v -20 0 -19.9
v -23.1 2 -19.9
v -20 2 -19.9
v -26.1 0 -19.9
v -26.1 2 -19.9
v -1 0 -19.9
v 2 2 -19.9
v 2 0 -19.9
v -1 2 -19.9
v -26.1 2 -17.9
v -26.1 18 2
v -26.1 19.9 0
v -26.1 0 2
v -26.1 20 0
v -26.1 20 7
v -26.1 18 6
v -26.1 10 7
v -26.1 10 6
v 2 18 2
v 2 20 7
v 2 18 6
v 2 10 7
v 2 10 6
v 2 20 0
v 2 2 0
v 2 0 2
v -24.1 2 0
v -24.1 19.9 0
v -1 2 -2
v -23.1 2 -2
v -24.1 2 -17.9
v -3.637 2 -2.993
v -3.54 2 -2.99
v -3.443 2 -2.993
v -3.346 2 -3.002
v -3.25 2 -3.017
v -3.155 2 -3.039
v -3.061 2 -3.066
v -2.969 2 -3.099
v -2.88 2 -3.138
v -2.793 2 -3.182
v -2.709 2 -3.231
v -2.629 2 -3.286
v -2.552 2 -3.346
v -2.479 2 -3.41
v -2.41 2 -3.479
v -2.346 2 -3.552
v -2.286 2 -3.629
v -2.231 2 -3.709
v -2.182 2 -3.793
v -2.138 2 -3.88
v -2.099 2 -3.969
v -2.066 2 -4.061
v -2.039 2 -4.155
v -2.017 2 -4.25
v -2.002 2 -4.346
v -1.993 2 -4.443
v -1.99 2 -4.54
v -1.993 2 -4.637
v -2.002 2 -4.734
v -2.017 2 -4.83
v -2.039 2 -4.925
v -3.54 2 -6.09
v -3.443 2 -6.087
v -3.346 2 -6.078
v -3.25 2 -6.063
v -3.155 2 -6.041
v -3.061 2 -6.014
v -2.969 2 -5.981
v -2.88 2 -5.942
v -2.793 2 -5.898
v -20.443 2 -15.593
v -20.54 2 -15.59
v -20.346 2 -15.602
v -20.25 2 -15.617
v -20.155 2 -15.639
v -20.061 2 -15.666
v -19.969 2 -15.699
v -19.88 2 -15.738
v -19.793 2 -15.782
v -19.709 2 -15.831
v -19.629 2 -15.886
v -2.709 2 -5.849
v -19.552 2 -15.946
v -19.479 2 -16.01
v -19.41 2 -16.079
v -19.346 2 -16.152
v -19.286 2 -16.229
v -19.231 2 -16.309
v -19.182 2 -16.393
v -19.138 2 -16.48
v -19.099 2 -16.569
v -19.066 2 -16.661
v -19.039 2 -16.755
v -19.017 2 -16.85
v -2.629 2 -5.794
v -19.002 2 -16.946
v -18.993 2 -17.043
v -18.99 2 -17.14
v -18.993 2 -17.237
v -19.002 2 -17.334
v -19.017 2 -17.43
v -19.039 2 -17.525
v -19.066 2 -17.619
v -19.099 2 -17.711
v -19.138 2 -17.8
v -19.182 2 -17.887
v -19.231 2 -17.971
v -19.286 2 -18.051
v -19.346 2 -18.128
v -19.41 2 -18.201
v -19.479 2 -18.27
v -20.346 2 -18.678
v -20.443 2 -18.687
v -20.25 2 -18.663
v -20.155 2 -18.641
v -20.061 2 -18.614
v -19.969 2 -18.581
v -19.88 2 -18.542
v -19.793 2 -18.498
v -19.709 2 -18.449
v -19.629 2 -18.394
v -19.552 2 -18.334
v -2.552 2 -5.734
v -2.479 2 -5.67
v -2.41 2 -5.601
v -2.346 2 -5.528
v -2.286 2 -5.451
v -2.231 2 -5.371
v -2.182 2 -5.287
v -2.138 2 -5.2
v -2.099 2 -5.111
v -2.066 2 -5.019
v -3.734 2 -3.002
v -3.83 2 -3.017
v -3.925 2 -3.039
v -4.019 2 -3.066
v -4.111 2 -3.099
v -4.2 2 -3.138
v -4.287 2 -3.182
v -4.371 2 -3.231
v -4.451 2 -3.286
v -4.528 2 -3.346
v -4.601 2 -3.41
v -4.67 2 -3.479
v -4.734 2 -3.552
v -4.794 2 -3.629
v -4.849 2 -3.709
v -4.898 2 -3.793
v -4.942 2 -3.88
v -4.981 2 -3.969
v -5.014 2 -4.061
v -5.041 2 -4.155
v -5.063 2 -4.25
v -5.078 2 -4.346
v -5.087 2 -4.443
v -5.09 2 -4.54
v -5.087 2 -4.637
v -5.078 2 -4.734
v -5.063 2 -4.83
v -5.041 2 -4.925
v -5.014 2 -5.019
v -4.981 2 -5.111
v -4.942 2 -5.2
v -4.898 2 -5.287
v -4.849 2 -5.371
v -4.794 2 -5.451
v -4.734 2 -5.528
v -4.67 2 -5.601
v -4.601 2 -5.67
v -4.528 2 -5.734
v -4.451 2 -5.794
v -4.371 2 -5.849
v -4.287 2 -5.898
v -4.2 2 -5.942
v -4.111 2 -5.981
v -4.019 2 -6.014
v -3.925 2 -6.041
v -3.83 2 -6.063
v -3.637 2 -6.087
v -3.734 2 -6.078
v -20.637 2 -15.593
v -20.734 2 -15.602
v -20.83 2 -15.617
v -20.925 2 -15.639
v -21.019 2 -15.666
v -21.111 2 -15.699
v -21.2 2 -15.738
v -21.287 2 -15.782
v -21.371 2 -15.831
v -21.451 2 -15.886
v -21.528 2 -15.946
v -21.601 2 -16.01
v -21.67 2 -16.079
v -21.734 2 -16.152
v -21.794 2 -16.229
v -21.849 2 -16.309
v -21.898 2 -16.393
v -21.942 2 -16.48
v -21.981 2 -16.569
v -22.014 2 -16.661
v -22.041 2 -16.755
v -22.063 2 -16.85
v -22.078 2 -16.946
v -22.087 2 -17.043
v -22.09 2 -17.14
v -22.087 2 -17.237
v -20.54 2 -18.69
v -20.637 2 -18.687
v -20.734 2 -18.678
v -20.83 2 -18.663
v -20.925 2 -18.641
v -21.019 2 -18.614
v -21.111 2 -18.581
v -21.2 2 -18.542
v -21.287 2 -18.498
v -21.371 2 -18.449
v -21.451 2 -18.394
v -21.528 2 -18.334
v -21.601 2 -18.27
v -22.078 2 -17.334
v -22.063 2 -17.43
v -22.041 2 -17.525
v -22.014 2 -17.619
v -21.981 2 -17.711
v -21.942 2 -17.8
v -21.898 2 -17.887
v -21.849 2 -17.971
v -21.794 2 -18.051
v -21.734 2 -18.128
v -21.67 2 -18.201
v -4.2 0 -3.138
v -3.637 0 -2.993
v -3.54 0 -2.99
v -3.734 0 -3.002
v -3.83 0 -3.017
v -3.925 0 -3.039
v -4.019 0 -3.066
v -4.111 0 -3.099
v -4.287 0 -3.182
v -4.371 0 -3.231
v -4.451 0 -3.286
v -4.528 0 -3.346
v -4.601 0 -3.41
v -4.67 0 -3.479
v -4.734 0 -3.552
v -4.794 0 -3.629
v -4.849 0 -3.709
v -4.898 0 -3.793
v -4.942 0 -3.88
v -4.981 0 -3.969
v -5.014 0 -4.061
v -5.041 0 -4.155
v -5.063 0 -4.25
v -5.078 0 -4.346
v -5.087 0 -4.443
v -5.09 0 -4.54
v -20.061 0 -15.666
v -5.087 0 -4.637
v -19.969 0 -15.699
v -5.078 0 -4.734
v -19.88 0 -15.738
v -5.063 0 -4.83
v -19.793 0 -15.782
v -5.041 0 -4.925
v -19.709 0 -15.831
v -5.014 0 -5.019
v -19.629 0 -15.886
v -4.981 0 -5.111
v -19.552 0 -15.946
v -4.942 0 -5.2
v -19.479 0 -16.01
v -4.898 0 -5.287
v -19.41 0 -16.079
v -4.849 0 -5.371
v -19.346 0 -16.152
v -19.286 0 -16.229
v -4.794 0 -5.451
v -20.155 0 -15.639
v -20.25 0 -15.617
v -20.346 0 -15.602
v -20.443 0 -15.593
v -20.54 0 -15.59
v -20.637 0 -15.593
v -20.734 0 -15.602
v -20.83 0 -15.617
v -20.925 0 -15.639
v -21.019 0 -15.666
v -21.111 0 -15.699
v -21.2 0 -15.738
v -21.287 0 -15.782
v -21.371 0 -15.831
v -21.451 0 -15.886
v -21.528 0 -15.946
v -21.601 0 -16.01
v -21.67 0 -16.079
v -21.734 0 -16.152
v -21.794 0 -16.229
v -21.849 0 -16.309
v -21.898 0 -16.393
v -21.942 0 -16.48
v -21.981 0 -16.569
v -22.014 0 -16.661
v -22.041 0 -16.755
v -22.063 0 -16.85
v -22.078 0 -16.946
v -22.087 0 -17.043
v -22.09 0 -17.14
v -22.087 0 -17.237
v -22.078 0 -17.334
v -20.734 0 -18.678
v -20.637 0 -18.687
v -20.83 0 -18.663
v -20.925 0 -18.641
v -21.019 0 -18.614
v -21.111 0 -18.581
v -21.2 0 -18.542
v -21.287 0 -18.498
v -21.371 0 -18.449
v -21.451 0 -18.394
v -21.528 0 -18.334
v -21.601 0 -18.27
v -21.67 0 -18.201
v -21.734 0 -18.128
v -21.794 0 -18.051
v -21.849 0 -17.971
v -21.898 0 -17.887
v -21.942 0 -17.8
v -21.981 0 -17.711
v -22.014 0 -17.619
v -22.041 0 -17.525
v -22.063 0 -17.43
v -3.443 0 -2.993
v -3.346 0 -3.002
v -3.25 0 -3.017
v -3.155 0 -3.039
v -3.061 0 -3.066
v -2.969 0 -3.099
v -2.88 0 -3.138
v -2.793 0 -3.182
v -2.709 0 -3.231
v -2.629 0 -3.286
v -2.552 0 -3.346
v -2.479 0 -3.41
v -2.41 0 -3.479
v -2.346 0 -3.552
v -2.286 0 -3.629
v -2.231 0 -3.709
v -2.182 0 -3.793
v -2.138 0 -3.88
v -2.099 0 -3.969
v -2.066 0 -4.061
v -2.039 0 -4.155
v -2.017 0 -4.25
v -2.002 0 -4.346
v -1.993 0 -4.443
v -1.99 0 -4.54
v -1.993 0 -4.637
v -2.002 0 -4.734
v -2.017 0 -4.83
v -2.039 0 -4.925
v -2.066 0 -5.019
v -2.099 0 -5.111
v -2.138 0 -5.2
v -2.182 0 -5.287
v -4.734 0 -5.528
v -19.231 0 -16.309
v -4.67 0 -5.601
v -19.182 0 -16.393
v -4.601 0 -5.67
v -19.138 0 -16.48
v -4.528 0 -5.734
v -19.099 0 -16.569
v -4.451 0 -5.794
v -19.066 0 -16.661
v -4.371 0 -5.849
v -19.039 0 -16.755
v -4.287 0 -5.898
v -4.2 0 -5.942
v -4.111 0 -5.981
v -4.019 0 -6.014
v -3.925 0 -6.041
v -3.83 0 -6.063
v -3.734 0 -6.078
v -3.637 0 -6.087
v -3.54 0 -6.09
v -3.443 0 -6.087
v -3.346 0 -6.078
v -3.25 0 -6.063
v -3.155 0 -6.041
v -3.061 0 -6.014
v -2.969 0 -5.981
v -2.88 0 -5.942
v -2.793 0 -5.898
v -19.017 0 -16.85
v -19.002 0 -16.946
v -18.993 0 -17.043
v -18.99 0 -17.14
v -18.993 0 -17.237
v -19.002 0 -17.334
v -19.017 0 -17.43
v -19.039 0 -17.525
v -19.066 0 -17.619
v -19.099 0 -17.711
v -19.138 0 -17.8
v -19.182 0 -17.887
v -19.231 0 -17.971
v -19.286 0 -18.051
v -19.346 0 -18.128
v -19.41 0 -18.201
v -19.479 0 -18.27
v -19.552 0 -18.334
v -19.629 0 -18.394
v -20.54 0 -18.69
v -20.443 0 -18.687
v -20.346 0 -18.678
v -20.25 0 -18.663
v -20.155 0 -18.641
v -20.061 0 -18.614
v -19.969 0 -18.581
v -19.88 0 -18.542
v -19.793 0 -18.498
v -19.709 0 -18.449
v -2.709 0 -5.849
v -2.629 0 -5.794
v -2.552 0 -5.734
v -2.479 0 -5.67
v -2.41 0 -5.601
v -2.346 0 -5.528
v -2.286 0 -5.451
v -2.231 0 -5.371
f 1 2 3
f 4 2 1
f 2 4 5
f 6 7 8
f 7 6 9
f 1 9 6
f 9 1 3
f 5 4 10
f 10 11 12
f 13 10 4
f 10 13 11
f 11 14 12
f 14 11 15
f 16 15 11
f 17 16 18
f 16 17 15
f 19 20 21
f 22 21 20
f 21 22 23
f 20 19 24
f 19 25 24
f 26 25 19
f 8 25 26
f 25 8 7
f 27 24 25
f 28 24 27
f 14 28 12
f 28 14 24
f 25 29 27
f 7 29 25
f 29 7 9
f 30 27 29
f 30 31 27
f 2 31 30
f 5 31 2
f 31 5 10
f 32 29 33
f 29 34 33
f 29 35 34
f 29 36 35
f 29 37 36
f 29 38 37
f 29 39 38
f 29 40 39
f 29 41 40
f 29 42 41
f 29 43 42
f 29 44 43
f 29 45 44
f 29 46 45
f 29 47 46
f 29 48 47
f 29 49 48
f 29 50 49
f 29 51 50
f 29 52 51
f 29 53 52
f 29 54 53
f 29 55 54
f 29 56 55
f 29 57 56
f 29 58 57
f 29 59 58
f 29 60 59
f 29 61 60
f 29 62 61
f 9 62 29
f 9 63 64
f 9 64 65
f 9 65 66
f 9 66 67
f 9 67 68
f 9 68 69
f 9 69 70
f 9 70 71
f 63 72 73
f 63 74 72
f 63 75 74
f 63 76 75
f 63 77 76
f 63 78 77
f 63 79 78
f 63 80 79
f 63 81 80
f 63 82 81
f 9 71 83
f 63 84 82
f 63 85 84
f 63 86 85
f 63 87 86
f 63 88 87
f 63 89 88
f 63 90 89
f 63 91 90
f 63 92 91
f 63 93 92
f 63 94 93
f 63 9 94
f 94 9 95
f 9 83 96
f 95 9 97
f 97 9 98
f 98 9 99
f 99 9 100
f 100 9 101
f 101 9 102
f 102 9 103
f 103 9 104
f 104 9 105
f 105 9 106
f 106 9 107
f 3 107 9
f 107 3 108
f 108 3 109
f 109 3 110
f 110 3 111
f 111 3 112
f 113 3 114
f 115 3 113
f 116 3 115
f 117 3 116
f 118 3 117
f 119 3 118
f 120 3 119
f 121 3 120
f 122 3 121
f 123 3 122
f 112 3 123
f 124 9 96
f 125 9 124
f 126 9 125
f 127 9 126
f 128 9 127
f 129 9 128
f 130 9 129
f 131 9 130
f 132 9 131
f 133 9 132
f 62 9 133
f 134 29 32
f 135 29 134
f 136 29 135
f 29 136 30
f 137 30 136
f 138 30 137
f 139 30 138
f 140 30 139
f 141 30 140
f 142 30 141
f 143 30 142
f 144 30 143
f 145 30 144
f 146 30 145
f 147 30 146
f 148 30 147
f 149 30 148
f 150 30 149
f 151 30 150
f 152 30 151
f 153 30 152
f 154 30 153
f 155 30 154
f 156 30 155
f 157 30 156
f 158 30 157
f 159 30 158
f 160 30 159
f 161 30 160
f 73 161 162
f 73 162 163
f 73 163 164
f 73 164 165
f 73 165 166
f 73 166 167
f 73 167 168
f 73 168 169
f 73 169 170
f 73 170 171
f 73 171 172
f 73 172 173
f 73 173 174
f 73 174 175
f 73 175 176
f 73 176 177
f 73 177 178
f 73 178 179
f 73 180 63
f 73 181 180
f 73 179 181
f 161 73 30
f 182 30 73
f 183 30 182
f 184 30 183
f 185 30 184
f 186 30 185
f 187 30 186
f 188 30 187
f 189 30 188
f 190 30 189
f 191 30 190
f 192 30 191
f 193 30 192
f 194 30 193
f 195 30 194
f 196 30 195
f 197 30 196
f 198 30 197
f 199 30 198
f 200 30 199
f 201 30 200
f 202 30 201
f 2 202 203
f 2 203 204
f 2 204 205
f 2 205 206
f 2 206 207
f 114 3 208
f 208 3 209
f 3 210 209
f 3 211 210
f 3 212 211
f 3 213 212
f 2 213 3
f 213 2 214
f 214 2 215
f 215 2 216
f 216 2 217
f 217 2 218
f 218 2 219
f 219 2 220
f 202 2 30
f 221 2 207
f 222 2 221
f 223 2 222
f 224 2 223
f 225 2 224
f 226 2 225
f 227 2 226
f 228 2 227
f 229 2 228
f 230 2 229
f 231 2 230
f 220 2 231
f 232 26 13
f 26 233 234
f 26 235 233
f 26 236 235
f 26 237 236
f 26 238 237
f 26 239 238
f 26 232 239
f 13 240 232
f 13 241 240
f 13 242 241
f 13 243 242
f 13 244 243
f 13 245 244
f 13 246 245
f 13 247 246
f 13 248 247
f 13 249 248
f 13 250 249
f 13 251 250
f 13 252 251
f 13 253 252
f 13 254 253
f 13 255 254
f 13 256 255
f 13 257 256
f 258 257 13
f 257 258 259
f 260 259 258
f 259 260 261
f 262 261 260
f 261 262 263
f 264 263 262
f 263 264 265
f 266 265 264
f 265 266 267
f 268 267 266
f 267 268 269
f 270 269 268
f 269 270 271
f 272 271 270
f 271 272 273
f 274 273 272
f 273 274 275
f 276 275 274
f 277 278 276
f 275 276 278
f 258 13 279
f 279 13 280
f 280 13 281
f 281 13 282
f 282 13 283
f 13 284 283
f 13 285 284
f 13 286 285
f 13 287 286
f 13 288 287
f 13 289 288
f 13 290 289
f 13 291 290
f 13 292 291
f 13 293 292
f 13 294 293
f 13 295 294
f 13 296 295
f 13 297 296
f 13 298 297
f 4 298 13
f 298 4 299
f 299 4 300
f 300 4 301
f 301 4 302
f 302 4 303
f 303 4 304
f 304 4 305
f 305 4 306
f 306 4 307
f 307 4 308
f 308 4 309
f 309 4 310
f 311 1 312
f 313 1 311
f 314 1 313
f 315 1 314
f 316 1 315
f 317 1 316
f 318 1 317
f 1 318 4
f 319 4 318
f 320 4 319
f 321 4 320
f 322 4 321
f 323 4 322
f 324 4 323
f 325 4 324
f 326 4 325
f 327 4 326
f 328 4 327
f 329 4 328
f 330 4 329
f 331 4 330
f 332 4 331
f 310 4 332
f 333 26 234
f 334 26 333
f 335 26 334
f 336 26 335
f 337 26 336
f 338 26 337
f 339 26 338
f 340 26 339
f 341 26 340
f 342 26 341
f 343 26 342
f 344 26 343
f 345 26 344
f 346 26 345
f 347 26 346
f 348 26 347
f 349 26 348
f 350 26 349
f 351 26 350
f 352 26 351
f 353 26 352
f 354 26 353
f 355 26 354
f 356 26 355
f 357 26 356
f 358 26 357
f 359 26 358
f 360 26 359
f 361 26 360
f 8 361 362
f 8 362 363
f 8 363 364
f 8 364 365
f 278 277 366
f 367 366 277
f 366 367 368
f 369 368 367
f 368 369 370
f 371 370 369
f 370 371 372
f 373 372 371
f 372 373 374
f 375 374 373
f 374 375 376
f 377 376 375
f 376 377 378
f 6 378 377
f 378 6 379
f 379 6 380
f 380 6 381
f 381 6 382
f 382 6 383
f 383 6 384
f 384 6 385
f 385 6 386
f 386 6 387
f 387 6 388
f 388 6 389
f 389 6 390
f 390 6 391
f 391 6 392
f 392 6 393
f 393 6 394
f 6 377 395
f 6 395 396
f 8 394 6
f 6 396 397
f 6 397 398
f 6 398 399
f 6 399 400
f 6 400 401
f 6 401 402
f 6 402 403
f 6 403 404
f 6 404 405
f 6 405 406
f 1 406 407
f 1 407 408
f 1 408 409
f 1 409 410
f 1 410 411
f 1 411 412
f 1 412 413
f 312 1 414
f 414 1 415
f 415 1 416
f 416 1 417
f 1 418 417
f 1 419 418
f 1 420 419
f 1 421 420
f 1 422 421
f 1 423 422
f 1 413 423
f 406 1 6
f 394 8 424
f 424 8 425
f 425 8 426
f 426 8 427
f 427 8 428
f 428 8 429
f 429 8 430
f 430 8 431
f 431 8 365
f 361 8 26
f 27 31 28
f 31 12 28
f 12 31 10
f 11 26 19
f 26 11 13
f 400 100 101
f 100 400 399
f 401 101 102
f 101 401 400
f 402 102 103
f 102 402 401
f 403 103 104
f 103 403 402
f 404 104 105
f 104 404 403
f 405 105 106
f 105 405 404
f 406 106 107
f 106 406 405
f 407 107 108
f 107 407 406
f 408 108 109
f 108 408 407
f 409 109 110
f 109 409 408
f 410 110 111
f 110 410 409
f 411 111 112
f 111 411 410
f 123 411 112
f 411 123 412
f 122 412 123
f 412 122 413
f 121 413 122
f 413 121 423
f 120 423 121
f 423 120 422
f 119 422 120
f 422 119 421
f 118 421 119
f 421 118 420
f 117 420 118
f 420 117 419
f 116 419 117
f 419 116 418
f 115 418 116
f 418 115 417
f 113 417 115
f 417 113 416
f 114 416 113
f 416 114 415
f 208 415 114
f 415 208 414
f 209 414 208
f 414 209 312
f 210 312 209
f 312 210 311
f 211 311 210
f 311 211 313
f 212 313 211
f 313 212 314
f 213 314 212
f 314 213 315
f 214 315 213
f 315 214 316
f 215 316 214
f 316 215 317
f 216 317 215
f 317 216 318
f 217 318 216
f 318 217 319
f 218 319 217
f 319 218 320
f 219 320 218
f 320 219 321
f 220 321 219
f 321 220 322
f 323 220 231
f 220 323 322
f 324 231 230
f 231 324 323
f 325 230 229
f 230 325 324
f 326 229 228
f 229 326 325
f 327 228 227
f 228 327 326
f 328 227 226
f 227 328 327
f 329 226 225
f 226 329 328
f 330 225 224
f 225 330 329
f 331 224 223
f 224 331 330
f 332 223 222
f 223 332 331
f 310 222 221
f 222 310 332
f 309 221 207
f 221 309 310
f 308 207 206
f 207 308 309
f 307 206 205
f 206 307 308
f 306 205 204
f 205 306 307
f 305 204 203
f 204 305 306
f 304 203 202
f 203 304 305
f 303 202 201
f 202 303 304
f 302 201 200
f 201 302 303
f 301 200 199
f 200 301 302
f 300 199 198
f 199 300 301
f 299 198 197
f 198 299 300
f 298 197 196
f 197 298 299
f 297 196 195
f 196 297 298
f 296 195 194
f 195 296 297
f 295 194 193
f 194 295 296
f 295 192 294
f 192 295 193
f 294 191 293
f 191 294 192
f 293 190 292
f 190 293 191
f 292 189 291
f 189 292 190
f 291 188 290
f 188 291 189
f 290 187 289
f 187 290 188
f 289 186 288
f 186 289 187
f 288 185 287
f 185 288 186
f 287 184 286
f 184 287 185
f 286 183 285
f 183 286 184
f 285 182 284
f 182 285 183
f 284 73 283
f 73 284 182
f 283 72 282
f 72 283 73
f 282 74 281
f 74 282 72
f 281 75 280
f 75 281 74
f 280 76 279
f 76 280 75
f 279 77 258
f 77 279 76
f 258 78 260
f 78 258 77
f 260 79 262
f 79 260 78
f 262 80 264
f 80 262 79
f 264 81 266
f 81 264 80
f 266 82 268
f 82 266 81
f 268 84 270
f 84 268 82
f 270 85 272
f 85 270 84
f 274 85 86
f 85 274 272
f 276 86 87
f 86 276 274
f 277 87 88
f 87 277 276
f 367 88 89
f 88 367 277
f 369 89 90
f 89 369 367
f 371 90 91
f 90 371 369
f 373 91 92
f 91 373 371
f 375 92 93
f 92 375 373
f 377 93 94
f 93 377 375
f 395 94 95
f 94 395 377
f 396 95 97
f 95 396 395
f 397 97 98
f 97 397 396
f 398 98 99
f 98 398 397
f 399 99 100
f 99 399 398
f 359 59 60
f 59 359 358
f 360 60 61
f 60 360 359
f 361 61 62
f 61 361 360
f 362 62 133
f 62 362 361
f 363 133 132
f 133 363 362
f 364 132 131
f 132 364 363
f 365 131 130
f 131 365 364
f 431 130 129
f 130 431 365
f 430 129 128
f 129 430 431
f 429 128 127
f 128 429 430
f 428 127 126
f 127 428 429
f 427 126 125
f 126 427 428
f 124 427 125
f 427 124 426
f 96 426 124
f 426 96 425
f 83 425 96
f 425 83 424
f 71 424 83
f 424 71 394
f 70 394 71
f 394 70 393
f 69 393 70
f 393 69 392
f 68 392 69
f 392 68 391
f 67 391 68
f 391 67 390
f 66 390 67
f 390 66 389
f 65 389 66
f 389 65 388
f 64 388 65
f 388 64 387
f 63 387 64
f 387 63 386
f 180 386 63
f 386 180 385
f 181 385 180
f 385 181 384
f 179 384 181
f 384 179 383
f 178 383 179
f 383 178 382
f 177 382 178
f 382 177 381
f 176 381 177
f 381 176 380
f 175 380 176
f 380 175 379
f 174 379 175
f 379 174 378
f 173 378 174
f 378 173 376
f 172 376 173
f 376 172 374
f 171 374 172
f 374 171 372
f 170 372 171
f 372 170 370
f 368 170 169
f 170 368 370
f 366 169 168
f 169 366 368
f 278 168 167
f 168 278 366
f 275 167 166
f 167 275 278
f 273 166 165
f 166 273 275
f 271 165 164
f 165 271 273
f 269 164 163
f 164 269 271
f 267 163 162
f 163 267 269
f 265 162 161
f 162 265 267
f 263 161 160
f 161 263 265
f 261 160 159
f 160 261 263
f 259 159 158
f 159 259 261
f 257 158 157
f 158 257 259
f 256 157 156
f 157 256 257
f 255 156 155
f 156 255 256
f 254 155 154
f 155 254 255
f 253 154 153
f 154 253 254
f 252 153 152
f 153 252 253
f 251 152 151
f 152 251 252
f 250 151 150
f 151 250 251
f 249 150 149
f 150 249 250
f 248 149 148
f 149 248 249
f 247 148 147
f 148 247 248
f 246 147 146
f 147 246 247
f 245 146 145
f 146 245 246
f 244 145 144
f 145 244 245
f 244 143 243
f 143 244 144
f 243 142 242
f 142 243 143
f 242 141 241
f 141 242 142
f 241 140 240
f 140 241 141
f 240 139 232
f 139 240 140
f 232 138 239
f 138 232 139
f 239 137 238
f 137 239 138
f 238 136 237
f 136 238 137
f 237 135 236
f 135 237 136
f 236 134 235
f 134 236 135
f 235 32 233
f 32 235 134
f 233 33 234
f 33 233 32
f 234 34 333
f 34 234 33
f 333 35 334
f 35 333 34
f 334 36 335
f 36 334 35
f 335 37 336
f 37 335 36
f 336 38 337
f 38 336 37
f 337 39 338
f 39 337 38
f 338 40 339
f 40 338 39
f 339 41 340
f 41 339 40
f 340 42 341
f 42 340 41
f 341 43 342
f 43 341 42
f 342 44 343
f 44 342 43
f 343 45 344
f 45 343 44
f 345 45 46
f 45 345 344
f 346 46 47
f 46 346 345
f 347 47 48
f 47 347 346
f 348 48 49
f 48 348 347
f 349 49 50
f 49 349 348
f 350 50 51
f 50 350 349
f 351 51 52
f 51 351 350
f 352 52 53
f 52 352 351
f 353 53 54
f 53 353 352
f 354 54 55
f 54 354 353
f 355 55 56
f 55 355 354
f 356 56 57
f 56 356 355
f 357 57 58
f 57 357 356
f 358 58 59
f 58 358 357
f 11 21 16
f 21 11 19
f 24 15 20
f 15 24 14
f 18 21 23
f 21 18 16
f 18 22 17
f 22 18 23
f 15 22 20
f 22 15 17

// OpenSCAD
$fn=100;

module supportUS_ar() {
dia_trou_fixation=4;

// -->
capteurUS_largeur = 19.9;
capteurUS_longueur= 22.1;
capteurUS_ep_PCB= 1.7;

module vis_capteur() {
    translate([2.54,2.54])
        circle(d=3.1);
    translate([2.54+12.6,2.54+17])
        circle(d=3.1);
}
module capteur_US_base() {
    cube([capteurUS_largeur,capteurUS_longueur,capteurUS_ep_PCB]);
    translate([0,0,-10])linear_extrude(height=20)vis_capteur();
    translate([9,capteurUS_longueur/2])cylinder(d=16.4, h=15.5);
    translate([17.9,0,-7]) cube([2,19,7]);
}
module capteur_US() {
    translate([-capteurUS_largeur/2,-capteurUS_longueur/2])capteur_US_base();
} //-->

module support90() {
    difference() {
        mirror([1,1,0]) {
            /*translate([-1,0,-2])
                cube([capteurUS_largeur-1,2,capteurUS_longueur+4+2]);*/
            translate([0,0,-2])
                cube([capteurUS_largeur,2,capteurUS_longueur+6]);
            
           /* translate([0,0,-2])linear_extrude(height=2) {
                polygon([
                    [0,0],
                    [capteurUS_largeur,2],
                    [0, capteurUS_largeur]]);
            }*/
           translate([0,0,capteurUS_longueur+2])linear_extrude(height=2) {
                polygon([
                    [0,0],
                    [capteurUS_largeur-2,2],
                    [0, capteurUS_largeur]]);
            }
	translate([0,0,-2])rotate([0,0,90])
                    cube([capteurUS_largeur,2,capteurUS_longueur+4+2]);            
        }
        
        
    translate([-2,-2-capteurUS_largeur/2,capteurUS_longueur/2+1])
        rotate([90,0,-90])#capteur_US();
    }
}

mirror([0,0,0])support90();

translate([-20,0,-2])#cube([2,6.2,capteurUS_longueur+6]);
translate([-10,6,-2])rotate([0,0,90])cube([2,10,capteurUS_longueur+6]);
}

module supportUS_av() {
dia_trou_fixation=4;

// -->
capteurUS_largeur = 19.9;
capteurUS_longueur= 22.1;
capteurUS_ep_PCB= 1.7;

module vis_capteur() {
    translate([2.54,2.54])
        circle(d=3.1);
    translate([2.54+12.6,2.54+17])
        circle(d=3.1);
}
module capteur_US_base() {
    cube([capteurUS_largeur,capteurUS_longueur,capteurUS_ep_PCB]);
    translate([0,0,-10])linear_extrude(height=20)vis_capteur();
    translate([9,capteurUS_longueur/2])cylinder(d=16.4, h=15.5);
    translate([17.9,0,-7]) cube([2,19,7]);
}
module capteur_US() {
    translate([-capteurUS_largeur/2,-capteurUS_longueur/2])capteur_US_base();
} //-->

module support90() {
    difference() {
        mirror([1,1,0]) {
            /*translate([-1,0,-2])
                cube([capteurUS_largeur-1,2,capteurUS_longueur+4+2]);*/
            translate([0,0,-2])
                cube([capteurUS_largeur,2,capteurUS_longueur+6]);
            
           /* translate([0,0,-2])linear_extrude(height=2) {
                polygon([
                    [0,0],
                    [capteurUS_largeur,2],
                    [0, capteurUS_largeur]]);
            }*/
           translate([0,0,capteurUS_longueur+2])linear_extrude(height=2) {
                polygon([
                    [0,0],
                    [capteurUS_largeur-2,2],
                    [0, capteurUS_largeur]]);
            }
	translate([0,0,-2])rotate([0,0,90])
                    cube([capteurUS_largeur,2,capteurUS_longueur+4+2]);            
        }
        
        
    translate([-2,-2-capteurUS_largeur/2,capteurUS_longueur/2+1])
        rotate([90,0,-90])#capteur_US();
    }
}

mirror([0,0,0])support90();

translate([-20,0,-2])cube([2,6.2,capteurUS_longueur+6]);
translate([-10,6,-2])rotate([0,0,90])#cube([1,10,capteurUS_longueur+6]);
}

// attention dépasse un peu de la face avant
//rotate([90,0,-90])supportUS_ar();
rotate([90,0,-90])supportUS_av();
